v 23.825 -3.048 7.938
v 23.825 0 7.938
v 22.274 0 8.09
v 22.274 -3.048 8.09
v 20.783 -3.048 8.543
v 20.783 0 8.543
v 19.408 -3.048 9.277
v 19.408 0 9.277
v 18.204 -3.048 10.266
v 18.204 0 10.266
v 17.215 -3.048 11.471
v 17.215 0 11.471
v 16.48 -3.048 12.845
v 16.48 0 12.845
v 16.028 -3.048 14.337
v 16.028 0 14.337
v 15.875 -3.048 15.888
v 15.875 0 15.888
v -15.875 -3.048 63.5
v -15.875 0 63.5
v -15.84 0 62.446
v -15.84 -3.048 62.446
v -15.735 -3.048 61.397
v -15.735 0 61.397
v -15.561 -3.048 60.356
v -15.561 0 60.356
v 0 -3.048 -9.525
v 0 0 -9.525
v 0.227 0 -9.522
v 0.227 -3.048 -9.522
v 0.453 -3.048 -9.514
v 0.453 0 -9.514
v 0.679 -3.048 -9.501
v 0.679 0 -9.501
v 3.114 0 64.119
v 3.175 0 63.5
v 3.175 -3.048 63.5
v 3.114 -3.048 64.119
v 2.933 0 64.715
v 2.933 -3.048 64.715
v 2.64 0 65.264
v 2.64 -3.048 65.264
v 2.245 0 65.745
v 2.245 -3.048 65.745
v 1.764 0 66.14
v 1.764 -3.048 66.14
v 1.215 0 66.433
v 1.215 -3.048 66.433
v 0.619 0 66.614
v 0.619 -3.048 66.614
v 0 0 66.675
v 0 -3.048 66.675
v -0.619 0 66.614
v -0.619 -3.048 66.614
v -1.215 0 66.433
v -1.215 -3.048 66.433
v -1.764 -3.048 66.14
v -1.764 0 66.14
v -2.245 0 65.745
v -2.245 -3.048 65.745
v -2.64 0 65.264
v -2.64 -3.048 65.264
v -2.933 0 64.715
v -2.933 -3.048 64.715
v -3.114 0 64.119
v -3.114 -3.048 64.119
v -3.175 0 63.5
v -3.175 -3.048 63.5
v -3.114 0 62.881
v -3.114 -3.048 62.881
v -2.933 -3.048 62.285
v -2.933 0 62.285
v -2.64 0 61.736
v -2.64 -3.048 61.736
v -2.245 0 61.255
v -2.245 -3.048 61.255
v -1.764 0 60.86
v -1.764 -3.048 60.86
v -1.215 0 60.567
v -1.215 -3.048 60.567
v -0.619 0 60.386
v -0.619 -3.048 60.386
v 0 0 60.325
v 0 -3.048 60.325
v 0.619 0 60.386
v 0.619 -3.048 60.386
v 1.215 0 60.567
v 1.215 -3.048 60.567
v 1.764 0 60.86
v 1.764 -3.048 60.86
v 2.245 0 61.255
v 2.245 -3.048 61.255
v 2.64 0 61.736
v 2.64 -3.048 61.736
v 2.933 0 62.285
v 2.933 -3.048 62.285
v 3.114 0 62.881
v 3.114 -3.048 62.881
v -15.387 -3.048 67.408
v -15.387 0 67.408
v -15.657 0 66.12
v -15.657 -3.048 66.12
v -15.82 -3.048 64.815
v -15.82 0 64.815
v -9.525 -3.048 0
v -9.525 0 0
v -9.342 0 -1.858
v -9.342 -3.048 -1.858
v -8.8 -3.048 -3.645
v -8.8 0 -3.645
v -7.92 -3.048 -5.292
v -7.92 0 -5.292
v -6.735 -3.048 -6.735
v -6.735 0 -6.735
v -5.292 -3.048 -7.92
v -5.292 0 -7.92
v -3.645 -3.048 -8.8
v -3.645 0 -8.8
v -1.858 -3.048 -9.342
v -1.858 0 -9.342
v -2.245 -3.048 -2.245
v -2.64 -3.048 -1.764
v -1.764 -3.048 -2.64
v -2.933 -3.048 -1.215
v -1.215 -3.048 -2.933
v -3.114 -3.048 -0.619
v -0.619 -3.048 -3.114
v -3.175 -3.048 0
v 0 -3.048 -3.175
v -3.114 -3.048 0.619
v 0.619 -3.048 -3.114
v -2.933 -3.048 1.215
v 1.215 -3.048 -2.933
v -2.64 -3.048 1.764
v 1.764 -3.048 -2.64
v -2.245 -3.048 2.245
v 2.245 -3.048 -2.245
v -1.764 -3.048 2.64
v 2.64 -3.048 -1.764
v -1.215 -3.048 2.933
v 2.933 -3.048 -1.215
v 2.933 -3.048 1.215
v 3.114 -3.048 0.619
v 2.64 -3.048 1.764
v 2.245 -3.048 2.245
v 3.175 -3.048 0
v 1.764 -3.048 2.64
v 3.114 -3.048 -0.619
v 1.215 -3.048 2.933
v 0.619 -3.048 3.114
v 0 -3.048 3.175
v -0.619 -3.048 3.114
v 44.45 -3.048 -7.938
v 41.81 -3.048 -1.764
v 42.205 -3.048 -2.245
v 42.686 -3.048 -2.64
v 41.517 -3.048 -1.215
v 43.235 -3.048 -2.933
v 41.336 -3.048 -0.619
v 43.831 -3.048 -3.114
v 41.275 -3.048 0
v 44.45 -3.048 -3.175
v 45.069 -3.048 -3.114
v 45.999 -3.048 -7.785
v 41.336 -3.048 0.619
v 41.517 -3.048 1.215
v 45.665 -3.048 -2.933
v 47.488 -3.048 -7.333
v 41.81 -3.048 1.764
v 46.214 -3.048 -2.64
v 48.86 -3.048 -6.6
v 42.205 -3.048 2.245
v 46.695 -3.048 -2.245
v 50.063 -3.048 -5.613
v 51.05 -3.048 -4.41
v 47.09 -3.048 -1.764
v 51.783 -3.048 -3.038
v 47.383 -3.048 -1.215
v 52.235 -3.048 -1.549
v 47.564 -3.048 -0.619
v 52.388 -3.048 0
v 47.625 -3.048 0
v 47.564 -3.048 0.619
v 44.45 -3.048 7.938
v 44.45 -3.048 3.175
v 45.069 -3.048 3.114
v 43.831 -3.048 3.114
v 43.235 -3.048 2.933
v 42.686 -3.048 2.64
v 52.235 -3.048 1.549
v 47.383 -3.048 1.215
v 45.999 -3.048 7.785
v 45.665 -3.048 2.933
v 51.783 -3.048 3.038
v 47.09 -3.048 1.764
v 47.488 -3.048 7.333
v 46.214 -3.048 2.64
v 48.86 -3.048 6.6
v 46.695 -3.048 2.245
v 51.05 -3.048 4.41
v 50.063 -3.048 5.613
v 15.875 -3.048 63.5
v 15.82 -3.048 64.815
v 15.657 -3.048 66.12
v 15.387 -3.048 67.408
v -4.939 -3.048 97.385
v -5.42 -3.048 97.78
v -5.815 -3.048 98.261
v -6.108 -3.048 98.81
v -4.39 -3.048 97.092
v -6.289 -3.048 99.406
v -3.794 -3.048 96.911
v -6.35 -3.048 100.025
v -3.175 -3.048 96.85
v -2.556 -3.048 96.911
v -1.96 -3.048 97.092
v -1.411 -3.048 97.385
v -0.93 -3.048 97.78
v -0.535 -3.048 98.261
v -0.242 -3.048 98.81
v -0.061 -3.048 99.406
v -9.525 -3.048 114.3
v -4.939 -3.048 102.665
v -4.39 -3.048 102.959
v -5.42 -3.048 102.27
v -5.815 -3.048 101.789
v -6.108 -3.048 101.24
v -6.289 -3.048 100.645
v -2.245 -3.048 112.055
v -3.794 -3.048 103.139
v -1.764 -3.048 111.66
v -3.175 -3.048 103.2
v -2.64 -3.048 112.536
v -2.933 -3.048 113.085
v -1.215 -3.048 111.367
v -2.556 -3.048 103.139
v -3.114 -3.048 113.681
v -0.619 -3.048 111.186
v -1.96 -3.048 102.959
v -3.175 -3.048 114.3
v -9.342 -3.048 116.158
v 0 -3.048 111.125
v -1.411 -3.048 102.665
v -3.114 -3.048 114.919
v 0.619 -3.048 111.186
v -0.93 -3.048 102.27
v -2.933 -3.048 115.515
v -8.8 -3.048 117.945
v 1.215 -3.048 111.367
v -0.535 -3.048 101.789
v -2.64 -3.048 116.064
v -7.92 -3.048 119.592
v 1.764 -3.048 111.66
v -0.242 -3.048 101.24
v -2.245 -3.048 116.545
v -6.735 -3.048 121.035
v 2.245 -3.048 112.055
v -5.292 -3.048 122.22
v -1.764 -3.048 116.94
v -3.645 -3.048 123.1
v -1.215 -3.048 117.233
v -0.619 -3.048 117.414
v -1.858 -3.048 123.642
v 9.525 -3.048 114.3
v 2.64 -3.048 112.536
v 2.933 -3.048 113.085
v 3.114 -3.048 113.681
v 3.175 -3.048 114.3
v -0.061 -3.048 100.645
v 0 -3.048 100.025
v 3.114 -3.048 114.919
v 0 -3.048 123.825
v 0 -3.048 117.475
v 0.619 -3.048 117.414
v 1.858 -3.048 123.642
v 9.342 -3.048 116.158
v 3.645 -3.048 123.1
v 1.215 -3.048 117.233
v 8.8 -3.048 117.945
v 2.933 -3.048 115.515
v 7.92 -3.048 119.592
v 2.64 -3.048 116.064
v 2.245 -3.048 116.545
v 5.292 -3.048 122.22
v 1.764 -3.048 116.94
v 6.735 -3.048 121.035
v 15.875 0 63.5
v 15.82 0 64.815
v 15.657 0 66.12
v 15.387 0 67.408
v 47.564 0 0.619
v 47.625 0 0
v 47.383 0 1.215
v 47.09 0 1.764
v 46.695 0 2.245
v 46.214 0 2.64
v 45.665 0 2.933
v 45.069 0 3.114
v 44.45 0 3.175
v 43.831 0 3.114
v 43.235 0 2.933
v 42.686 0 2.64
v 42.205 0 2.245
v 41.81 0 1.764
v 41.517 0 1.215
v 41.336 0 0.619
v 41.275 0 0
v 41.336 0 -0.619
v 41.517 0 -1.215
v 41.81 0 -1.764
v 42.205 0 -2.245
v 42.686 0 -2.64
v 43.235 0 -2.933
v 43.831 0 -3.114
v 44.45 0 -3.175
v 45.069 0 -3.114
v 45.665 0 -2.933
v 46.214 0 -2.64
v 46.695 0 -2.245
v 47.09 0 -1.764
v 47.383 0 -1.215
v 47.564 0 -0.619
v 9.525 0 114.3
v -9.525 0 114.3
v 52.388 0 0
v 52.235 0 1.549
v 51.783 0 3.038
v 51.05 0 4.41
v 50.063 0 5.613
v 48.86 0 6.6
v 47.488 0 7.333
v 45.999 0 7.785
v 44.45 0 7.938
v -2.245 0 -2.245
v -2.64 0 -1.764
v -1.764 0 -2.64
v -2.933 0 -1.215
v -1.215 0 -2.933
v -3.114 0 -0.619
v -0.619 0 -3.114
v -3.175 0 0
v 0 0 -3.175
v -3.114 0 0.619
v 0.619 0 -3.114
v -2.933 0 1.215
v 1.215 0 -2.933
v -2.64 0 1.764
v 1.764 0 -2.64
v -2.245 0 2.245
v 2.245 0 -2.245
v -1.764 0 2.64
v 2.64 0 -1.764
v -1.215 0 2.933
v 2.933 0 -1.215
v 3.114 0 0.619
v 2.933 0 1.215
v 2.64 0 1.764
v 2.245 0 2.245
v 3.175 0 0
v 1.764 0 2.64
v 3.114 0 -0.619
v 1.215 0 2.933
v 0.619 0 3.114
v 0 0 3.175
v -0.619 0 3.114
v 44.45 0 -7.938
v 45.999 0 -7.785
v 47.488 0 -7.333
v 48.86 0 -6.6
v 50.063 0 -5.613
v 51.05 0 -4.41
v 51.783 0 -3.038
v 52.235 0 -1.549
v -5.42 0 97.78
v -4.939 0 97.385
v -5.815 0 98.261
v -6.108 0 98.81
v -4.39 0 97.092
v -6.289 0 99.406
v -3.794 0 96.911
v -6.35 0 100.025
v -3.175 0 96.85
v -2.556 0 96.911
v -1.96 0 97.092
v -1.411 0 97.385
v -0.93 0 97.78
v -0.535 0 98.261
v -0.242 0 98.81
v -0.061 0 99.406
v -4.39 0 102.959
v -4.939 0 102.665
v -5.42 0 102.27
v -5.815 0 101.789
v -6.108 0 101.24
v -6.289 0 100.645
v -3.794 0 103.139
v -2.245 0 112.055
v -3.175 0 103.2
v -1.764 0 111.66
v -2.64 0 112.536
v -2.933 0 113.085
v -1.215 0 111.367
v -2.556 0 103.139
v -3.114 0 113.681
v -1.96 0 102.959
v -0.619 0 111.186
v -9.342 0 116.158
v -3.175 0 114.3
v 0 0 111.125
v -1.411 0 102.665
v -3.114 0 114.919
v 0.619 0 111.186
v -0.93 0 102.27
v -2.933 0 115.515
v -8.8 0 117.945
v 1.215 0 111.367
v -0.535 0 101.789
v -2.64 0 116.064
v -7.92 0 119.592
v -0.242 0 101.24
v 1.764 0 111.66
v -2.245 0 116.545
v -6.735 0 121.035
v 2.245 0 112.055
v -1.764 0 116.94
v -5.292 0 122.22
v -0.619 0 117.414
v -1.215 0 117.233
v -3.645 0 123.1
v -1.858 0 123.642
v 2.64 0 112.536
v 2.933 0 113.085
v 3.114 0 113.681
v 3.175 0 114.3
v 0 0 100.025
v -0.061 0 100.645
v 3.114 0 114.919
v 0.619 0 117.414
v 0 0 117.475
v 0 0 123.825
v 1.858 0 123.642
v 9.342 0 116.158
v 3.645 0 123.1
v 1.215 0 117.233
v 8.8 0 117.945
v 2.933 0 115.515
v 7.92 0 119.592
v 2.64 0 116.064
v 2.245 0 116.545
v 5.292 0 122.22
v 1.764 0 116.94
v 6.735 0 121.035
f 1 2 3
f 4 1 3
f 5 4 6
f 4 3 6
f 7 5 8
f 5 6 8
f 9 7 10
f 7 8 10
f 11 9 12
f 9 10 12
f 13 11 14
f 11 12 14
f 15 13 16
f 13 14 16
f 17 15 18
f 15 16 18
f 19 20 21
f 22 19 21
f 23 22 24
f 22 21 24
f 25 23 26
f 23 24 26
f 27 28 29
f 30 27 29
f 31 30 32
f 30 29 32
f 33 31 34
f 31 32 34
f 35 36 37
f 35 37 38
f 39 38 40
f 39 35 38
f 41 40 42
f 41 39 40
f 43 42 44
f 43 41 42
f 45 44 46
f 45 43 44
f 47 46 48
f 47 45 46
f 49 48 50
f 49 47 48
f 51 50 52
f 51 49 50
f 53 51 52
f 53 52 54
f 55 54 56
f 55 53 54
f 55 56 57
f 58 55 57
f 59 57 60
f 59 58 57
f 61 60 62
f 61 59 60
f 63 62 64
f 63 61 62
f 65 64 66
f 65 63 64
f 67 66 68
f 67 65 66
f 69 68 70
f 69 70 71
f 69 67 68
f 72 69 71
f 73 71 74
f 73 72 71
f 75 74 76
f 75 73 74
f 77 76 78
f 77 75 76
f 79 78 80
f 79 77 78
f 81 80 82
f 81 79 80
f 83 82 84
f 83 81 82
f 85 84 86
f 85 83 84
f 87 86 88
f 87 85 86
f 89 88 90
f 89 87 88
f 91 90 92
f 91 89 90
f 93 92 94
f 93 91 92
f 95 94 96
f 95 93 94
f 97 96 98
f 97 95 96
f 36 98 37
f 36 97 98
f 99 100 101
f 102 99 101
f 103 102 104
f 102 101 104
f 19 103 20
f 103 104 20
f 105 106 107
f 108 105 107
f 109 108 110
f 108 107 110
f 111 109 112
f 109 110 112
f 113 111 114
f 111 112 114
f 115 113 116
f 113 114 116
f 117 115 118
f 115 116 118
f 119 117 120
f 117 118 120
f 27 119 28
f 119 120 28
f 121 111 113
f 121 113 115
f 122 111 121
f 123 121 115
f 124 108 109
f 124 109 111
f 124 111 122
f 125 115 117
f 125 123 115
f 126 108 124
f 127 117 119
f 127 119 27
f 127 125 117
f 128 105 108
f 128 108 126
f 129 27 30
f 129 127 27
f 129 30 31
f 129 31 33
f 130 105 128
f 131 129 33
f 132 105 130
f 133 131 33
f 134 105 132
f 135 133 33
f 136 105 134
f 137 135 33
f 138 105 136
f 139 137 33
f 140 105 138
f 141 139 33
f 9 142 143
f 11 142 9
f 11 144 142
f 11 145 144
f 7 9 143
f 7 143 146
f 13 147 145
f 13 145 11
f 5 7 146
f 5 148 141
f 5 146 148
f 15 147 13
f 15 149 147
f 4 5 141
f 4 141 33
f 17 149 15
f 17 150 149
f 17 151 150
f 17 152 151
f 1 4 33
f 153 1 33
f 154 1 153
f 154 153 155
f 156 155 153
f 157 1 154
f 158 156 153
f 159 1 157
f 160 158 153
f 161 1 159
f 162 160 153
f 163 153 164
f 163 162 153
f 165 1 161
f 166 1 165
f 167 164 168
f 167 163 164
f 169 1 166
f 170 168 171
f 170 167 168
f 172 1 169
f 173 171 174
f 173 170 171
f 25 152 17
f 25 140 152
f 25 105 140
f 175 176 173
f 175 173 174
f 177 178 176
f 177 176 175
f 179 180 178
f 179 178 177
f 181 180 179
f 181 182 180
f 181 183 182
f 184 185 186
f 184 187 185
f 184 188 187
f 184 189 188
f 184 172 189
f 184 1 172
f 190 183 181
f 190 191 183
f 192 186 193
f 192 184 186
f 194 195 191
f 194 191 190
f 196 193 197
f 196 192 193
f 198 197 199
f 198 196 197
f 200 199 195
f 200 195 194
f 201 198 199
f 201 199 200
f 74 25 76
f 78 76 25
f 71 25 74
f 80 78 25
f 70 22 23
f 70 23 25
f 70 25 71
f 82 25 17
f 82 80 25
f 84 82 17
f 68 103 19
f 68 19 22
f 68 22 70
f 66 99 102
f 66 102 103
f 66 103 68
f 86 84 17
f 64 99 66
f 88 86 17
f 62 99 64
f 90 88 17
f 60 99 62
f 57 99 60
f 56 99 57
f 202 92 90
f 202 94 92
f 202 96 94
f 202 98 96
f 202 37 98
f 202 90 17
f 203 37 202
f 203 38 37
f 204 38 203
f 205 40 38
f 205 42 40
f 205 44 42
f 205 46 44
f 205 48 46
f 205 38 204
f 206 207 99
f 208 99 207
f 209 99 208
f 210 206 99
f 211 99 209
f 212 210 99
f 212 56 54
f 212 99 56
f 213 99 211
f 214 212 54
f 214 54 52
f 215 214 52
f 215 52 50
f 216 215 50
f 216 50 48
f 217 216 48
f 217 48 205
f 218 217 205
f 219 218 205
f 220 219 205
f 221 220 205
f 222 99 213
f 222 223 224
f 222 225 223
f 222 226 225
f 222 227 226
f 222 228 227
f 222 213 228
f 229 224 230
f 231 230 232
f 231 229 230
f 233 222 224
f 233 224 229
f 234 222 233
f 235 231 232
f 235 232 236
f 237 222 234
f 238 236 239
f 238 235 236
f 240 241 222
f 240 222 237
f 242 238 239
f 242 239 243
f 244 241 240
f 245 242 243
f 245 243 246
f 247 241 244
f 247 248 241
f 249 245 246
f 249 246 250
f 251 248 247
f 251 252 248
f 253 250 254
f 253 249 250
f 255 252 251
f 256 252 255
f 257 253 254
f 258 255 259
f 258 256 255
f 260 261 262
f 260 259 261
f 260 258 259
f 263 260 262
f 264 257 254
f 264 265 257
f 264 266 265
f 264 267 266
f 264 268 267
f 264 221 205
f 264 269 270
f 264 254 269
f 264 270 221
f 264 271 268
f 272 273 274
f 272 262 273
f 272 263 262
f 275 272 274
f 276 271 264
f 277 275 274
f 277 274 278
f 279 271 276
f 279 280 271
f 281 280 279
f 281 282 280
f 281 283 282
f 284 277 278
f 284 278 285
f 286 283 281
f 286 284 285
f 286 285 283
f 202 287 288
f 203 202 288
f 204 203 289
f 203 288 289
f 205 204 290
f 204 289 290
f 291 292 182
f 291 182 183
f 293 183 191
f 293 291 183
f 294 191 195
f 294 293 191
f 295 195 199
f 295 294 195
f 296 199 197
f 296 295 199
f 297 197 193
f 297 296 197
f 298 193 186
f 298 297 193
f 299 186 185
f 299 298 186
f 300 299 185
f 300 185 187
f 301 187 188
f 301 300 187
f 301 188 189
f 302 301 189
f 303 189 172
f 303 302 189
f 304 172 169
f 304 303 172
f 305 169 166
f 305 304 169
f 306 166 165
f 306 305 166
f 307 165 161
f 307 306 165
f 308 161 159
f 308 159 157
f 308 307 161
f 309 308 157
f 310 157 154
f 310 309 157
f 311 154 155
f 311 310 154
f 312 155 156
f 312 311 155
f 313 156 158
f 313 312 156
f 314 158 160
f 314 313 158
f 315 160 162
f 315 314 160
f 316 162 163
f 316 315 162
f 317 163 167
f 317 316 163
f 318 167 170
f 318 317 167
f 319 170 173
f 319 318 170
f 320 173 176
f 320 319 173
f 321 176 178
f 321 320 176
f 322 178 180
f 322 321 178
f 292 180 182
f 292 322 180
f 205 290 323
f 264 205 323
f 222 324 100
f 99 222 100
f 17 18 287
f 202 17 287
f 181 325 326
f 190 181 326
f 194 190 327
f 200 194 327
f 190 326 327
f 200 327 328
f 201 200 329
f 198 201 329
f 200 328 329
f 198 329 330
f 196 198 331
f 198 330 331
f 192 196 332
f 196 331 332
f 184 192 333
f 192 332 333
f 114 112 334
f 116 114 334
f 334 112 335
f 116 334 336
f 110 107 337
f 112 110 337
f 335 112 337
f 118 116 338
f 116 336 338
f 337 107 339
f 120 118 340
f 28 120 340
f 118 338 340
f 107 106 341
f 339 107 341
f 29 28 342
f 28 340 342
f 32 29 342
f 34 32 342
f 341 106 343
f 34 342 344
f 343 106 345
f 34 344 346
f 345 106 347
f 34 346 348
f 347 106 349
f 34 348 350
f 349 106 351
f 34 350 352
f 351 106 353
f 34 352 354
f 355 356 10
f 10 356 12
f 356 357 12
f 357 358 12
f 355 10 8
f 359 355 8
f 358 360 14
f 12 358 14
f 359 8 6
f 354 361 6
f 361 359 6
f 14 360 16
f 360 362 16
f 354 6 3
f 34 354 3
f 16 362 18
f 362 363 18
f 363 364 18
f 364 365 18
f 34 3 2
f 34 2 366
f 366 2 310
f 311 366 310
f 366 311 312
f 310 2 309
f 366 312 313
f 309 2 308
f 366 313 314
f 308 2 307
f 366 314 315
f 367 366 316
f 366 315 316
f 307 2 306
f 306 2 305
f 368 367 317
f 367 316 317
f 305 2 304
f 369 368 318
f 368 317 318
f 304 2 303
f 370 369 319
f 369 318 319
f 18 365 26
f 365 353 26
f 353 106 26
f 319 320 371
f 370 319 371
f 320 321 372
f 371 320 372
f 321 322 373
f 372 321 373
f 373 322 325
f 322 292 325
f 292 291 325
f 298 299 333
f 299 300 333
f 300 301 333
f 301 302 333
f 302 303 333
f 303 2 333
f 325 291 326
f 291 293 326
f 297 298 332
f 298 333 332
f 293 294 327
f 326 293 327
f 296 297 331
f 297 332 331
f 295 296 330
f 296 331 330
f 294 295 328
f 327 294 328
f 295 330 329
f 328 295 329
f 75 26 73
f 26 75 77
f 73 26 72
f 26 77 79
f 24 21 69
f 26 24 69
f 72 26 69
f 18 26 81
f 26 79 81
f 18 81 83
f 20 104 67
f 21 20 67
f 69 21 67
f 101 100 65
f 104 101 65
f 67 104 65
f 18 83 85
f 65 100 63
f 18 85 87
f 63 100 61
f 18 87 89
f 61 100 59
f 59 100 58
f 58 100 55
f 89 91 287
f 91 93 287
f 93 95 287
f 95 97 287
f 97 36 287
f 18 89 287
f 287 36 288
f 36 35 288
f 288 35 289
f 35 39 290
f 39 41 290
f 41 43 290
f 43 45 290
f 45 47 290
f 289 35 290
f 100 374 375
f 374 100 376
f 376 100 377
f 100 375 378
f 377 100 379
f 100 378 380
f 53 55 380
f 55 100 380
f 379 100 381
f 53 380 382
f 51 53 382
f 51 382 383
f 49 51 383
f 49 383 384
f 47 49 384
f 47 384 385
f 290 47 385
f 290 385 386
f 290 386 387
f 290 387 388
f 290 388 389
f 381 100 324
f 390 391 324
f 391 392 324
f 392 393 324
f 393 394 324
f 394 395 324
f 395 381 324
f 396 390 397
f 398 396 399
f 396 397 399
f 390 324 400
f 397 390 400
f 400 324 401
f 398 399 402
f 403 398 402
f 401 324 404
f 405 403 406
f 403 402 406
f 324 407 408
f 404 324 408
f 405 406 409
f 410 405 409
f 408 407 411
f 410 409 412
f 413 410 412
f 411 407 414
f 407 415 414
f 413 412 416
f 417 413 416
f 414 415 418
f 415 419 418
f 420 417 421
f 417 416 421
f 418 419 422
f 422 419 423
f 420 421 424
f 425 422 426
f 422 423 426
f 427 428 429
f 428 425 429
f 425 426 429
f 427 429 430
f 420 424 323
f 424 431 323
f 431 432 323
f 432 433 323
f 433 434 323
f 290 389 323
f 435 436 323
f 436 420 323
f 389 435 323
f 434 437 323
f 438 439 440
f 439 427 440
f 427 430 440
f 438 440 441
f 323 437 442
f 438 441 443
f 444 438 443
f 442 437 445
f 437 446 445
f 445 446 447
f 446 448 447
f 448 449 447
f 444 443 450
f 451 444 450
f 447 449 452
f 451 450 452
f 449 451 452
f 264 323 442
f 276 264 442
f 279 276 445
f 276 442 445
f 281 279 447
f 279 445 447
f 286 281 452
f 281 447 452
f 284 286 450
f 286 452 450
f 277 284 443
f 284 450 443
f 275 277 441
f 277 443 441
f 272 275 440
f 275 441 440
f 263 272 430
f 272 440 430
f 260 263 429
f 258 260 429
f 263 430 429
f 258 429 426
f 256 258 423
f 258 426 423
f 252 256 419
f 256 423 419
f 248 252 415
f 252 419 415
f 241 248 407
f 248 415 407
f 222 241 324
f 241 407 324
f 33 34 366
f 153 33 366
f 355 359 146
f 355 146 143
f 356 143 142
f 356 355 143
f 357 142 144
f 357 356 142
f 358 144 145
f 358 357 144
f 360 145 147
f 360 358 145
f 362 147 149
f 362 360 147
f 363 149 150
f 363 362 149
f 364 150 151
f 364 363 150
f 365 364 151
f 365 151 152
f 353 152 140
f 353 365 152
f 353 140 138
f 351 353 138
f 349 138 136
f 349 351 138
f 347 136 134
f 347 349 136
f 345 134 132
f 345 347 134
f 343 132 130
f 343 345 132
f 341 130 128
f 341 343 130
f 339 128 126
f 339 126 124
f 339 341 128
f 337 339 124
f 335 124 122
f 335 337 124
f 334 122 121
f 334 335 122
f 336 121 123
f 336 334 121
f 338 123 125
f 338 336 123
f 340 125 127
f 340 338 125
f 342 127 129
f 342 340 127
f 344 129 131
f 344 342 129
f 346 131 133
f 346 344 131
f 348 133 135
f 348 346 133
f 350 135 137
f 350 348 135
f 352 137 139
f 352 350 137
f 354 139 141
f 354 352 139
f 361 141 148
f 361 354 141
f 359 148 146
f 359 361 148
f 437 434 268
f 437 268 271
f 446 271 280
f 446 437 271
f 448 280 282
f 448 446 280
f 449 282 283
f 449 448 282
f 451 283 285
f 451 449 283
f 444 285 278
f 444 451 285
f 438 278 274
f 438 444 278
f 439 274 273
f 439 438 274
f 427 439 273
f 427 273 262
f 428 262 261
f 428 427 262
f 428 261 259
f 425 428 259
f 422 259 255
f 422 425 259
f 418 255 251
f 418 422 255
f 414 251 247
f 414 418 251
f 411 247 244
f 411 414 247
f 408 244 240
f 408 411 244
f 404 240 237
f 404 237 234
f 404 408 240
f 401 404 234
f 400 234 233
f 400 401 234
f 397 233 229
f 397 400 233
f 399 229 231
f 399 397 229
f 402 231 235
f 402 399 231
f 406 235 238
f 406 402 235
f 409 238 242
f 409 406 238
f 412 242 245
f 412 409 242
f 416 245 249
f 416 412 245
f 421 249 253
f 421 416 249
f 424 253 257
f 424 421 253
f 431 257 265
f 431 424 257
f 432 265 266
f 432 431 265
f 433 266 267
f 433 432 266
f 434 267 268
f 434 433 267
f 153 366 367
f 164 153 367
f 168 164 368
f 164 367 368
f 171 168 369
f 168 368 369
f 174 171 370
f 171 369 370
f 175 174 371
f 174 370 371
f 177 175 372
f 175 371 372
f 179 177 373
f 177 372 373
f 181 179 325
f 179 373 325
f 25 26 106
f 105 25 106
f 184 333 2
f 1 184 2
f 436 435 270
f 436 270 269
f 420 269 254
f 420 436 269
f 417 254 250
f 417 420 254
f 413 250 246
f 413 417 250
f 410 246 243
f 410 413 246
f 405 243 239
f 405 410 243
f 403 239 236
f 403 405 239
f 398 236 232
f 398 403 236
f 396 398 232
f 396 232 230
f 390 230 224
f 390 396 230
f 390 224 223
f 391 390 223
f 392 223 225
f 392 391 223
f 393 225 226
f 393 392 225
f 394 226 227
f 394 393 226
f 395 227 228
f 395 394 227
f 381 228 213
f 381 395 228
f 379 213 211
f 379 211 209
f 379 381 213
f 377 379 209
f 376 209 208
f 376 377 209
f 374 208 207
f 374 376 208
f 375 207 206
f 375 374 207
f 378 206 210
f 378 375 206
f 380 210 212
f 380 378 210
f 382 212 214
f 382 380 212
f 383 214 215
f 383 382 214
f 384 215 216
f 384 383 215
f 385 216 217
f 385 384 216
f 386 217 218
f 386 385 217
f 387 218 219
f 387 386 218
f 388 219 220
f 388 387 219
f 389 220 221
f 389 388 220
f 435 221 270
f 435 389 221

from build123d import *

# Parameters (mm, degrees)
F0_R     = 3.175
F1_DEPTH = 3.048


with BuildPart() as f1:
    # F0 (on Front) → F1 (new body)
    with BuildSketch(Plane.XZ):
        with BuildLine():
            ThreePointArc((-9.525, 114.3), (0, 104.775), (9.525, 114.3))
            ThreePointArc((9.525, 114.3), (0, 123.825), (-9.525, 114.3))
        make_face()
        with Locations((0, 114.3)):
            Circle(F0_R, mode=Mode.SUBTRACT)
        with BuildLine():
            Line((15.3865384615, 67.4076923077), (9.525, 114.3))
            ThreePointArc((9.525, 114.3), (0, 104.775), (-9.525, 114.3))
            Line((-9.525, 114.3), (-15.3865384615, 67.4076923077))
            ThreePointArc((-15.3865384615, 67.4076923077), (0, 79.375), (15.3865384615, 67.4076923077))
        make_face()
        with Locations((-3.175, 100.0252)):
            Circle(F0_R, mode=Mode.SUBTRACT)
        with BuildLine():
            Line((15.875, 63.5), (15.3865384615, 67.4076923077))
            ThreePointArc((15.3865384615, 67.4076923077), (0, 79.375), (-15.3865384615, 67.4076923077))
            Line((-15.3865384615, 67.4076923077), (-15.875, 63.5))
            Line((-15.875, 63.5), (-15.5606435644, 60.3564356436))
            ThreePointArc((-15.5606435644, 60.3564356436), (1.5796215395, 47.7037846054), (15.875, 63.5))
        make_face()
        with Locations((0, 63.5)):
            Circle(F0_R, mode=Mode.SUBTRACT)
        with BuildLine():
            ThreePointArc((15.875, 63.5), (15.7524112928, 65.4690514116), (15.3865384615, 67.4076923077))
            Line((15.3865384615, 67.4076923077), (15.875, 63.5))
        make_face()
        with BuildLine():
            Line((-15.875, 63.5), (-15.3865384615, 67.4076923077))
            ThreePointArc((-15.3865384615, 67.4076923077), (-15.7524112928, 65.4690514116), (-15.875, 63.5))
        make_face()
        with BuildLine():
            Line((15.875, 15.8877), (15.875, 63.5))
            ThreePointArc((15.875, 63.5), (1.5796215395, 47.7037846054), (-15.5606435644, 60.3564356436))
            Line((-15.5606435644, 60.3564356436), (-9.525, 0))
            ThreePointArc((-9.525, 0), (0, 9.525), (9.525, 0))
            ThreePointArc((9.525, 0), (6.9712901065, -6.4905114784), (0.6794904459, -9.5007324841))
            Line((0.6794904459, -9.5007324841), (44.45, -7.9375))
            ThreePointArc((44.45, -7.9375), (36.5125, 0), (44.45, 7.9375))
            Line((44.45, 7.9375), (23.8252, 7.9375))
            ThreePointArc((23.8252, 7.9375), (18.2035596682, 10.2660596682), (15.875, 15.8877))
        make_face()
        with BuildLine():
            Line((-15.5606435644, 60.3564356436), (-15.875, 63.5))
            ThreePointArc((-15.875, 63.5), (-15.7962153946, 61.9203784605), (-15.5606435644, 60.3564356436))
        make_face()
        with BuildLine():
            ThreePointArc((9.525, 0), (0, 9.525), (-9.525, 0))
            ThreePointArc((-9.525, 0), (-6.7351920908, -6.7351920908), (0, -9.525))
            Line((0, -9.525), (0.6794904459, -9.5007324841))
            ThreePointArc((0.6794904459, -9.5007324841), (6.9712901065, -6.4905114784), (9.525, 0))
        make_face()
        Circle(F0_R, mode=Mode.SUBTRACT)
        with BuildLine():
            Line((0.6794904459, -9.5007324841), (0, -9.525))
            ThreePointArc((0, -9.525), (0.3399618281, -9.5189311877), (0.6794904459, -9.5007324841))
        make_face()
        with BuildLine():
            ThreePointArc((52.3875, 0), (50.0626600757, 5.6126600757), (44.45, 7.9375))
            ThreePointArc((44.45, 7.9375), (36.5125, 0), (44.45, -7.9375))
            ThreePointArc((44.45, -7.9375), (50.0626600757, -5.6126600757), (52.3875, 0))
        make_face()
        with Locations((44.45, 0)):
            Circle(F0_R, mode=Mode.SUBTRACT)
    extrude(amount=F1_DEPTH)


solid = f1.part
